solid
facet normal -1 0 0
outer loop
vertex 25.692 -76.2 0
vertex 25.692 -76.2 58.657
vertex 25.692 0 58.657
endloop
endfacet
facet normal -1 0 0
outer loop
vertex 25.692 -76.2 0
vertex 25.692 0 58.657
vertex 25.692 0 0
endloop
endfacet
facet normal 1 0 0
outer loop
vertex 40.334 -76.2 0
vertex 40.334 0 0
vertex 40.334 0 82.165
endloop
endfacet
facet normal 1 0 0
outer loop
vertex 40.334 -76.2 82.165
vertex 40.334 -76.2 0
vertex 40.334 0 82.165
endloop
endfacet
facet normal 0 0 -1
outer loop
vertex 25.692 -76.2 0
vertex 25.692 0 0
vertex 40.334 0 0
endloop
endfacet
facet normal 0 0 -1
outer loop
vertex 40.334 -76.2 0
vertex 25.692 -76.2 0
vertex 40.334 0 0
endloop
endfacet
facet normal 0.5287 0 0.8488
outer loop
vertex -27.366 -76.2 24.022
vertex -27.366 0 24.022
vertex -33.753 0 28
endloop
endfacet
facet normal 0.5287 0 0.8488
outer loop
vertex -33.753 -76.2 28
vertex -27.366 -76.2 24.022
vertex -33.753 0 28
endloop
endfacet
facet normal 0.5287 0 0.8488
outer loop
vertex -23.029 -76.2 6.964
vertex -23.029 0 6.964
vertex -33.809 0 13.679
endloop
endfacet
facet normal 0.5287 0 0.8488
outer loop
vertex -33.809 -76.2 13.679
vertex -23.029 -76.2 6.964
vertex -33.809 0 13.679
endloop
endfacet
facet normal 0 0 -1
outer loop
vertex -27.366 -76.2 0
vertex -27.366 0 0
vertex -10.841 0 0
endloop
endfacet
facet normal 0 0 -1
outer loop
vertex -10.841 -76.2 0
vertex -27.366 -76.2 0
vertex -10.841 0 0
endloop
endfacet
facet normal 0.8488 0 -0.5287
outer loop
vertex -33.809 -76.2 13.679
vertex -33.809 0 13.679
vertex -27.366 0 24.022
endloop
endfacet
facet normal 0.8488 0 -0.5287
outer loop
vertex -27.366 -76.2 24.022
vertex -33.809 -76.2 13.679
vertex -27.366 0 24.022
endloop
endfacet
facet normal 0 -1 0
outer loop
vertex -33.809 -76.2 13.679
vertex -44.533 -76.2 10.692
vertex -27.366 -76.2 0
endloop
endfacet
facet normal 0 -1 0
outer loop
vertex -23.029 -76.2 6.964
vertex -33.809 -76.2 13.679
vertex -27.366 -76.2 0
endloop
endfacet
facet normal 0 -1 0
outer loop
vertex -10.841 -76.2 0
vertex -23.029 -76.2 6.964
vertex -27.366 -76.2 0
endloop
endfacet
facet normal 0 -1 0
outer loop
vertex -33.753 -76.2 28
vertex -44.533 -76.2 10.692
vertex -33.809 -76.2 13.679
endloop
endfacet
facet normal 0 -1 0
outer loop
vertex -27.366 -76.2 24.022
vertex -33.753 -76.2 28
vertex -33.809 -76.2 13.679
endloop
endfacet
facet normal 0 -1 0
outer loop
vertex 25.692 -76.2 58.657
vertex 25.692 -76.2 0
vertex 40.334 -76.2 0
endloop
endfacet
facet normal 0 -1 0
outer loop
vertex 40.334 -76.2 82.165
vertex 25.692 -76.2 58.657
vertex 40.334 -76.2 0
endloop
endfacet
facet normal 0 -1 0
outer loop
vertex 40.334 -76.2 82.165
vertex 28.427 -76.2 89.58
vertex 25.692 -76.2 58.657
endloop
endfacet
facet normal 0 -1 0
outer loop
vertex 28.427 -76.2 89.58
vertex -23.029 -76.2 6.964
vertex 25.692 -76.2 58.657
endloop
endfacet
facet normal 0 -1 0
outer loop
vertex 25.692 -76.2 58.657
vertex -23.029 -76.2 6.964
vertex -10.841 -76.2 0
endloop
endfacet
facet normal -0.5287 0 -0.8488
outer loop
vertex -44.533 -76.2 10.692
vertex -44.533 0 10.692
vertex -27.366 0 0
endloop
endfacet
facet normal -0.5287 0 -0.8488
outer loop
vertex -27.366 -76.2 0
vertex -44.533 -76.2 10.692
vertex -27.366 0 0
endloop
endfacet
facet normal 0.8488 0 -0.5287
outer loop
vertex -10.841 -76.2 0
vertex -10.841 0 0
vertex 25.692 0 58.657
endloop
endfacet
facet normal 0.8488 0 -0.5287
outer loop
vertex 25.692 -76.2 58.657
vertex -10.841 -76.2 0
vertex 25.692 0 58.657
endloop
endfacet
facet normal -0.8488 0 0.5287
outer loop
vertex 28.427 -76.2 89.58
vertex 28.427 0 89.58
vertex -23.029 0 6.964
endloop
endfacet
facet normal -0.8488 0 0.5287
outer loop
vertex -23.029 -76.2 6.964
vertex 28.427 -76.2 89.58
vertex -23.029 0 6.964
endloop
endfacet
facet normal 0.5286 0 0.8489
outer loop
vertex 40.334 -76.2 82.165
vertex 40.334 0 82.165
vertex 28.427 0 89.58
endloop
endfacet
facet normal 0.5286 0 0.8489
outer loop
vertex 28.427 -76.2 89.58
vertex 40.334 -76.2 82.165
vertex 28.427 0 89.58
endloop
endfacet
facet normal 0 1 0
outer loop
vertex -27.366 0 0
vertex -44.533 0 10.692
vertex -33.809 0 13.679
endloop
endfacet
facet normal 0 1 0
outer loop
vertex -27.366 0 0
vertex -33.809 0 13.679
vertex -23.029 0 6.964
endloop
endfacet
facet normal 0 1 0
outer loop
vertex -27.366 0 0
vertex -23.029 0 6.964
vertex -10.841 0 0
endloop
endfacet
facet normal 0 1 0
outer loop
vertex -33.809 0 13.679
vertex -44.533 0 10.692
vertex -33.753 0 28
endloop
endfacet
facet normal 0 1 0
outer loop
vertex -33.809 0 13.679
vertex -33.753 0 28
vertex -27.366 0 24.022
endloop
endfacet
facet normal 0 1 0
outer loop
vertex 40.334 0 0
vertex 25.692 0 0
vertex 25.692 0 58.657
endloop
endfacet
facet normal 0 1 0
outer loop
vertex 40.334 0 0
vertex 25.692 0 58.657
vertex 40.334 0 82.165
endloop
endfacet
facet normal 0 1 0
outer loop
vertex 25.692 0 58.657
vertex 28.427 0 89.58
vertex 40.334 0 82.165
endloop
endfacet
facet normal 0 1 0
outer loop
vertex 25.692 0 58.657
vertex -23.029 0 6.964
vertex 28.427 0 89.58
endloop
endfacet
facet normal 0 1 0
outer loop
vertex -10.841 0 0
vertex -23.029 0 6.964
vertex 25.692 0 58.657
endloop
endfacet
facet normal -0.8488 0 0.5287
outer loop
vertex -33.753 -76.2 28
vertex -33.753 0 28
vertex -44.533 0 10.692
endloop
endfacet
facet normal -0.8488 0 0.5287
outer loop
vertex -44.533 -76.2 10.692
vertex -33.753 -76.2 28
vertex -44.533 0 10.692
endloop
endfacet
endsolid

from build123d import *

# Parameters (mm, degrees)
F1_DEPTH = 76.2


with BuildPart() as f1:
    # F0 (on Front) → F1 (new body)
    with BuildSketch(Plane.XZ):
        Polygon((-44.533051, 10.691937), (-27.366411, 0), (-23.028744, 6.964423), (-33.808812, 13.678597), (-27.366411, 24.022314), (-33.752983, 28.000077), align=None)
        Polygon((40.3336, 82.164579), (25.692132, 58.656697), (25.692132, 0), (40.3336, 0), align=None)
        Polygon((-23.028744, 6.964423), (-27.366411, 0), (-10.841151, 0), (25.692132, 58.656697), (40.3336, 82.164579), (28.427108, 89.580327), align=None)
    extrude(amount=F1_DEPTH)


solid = f1.part
